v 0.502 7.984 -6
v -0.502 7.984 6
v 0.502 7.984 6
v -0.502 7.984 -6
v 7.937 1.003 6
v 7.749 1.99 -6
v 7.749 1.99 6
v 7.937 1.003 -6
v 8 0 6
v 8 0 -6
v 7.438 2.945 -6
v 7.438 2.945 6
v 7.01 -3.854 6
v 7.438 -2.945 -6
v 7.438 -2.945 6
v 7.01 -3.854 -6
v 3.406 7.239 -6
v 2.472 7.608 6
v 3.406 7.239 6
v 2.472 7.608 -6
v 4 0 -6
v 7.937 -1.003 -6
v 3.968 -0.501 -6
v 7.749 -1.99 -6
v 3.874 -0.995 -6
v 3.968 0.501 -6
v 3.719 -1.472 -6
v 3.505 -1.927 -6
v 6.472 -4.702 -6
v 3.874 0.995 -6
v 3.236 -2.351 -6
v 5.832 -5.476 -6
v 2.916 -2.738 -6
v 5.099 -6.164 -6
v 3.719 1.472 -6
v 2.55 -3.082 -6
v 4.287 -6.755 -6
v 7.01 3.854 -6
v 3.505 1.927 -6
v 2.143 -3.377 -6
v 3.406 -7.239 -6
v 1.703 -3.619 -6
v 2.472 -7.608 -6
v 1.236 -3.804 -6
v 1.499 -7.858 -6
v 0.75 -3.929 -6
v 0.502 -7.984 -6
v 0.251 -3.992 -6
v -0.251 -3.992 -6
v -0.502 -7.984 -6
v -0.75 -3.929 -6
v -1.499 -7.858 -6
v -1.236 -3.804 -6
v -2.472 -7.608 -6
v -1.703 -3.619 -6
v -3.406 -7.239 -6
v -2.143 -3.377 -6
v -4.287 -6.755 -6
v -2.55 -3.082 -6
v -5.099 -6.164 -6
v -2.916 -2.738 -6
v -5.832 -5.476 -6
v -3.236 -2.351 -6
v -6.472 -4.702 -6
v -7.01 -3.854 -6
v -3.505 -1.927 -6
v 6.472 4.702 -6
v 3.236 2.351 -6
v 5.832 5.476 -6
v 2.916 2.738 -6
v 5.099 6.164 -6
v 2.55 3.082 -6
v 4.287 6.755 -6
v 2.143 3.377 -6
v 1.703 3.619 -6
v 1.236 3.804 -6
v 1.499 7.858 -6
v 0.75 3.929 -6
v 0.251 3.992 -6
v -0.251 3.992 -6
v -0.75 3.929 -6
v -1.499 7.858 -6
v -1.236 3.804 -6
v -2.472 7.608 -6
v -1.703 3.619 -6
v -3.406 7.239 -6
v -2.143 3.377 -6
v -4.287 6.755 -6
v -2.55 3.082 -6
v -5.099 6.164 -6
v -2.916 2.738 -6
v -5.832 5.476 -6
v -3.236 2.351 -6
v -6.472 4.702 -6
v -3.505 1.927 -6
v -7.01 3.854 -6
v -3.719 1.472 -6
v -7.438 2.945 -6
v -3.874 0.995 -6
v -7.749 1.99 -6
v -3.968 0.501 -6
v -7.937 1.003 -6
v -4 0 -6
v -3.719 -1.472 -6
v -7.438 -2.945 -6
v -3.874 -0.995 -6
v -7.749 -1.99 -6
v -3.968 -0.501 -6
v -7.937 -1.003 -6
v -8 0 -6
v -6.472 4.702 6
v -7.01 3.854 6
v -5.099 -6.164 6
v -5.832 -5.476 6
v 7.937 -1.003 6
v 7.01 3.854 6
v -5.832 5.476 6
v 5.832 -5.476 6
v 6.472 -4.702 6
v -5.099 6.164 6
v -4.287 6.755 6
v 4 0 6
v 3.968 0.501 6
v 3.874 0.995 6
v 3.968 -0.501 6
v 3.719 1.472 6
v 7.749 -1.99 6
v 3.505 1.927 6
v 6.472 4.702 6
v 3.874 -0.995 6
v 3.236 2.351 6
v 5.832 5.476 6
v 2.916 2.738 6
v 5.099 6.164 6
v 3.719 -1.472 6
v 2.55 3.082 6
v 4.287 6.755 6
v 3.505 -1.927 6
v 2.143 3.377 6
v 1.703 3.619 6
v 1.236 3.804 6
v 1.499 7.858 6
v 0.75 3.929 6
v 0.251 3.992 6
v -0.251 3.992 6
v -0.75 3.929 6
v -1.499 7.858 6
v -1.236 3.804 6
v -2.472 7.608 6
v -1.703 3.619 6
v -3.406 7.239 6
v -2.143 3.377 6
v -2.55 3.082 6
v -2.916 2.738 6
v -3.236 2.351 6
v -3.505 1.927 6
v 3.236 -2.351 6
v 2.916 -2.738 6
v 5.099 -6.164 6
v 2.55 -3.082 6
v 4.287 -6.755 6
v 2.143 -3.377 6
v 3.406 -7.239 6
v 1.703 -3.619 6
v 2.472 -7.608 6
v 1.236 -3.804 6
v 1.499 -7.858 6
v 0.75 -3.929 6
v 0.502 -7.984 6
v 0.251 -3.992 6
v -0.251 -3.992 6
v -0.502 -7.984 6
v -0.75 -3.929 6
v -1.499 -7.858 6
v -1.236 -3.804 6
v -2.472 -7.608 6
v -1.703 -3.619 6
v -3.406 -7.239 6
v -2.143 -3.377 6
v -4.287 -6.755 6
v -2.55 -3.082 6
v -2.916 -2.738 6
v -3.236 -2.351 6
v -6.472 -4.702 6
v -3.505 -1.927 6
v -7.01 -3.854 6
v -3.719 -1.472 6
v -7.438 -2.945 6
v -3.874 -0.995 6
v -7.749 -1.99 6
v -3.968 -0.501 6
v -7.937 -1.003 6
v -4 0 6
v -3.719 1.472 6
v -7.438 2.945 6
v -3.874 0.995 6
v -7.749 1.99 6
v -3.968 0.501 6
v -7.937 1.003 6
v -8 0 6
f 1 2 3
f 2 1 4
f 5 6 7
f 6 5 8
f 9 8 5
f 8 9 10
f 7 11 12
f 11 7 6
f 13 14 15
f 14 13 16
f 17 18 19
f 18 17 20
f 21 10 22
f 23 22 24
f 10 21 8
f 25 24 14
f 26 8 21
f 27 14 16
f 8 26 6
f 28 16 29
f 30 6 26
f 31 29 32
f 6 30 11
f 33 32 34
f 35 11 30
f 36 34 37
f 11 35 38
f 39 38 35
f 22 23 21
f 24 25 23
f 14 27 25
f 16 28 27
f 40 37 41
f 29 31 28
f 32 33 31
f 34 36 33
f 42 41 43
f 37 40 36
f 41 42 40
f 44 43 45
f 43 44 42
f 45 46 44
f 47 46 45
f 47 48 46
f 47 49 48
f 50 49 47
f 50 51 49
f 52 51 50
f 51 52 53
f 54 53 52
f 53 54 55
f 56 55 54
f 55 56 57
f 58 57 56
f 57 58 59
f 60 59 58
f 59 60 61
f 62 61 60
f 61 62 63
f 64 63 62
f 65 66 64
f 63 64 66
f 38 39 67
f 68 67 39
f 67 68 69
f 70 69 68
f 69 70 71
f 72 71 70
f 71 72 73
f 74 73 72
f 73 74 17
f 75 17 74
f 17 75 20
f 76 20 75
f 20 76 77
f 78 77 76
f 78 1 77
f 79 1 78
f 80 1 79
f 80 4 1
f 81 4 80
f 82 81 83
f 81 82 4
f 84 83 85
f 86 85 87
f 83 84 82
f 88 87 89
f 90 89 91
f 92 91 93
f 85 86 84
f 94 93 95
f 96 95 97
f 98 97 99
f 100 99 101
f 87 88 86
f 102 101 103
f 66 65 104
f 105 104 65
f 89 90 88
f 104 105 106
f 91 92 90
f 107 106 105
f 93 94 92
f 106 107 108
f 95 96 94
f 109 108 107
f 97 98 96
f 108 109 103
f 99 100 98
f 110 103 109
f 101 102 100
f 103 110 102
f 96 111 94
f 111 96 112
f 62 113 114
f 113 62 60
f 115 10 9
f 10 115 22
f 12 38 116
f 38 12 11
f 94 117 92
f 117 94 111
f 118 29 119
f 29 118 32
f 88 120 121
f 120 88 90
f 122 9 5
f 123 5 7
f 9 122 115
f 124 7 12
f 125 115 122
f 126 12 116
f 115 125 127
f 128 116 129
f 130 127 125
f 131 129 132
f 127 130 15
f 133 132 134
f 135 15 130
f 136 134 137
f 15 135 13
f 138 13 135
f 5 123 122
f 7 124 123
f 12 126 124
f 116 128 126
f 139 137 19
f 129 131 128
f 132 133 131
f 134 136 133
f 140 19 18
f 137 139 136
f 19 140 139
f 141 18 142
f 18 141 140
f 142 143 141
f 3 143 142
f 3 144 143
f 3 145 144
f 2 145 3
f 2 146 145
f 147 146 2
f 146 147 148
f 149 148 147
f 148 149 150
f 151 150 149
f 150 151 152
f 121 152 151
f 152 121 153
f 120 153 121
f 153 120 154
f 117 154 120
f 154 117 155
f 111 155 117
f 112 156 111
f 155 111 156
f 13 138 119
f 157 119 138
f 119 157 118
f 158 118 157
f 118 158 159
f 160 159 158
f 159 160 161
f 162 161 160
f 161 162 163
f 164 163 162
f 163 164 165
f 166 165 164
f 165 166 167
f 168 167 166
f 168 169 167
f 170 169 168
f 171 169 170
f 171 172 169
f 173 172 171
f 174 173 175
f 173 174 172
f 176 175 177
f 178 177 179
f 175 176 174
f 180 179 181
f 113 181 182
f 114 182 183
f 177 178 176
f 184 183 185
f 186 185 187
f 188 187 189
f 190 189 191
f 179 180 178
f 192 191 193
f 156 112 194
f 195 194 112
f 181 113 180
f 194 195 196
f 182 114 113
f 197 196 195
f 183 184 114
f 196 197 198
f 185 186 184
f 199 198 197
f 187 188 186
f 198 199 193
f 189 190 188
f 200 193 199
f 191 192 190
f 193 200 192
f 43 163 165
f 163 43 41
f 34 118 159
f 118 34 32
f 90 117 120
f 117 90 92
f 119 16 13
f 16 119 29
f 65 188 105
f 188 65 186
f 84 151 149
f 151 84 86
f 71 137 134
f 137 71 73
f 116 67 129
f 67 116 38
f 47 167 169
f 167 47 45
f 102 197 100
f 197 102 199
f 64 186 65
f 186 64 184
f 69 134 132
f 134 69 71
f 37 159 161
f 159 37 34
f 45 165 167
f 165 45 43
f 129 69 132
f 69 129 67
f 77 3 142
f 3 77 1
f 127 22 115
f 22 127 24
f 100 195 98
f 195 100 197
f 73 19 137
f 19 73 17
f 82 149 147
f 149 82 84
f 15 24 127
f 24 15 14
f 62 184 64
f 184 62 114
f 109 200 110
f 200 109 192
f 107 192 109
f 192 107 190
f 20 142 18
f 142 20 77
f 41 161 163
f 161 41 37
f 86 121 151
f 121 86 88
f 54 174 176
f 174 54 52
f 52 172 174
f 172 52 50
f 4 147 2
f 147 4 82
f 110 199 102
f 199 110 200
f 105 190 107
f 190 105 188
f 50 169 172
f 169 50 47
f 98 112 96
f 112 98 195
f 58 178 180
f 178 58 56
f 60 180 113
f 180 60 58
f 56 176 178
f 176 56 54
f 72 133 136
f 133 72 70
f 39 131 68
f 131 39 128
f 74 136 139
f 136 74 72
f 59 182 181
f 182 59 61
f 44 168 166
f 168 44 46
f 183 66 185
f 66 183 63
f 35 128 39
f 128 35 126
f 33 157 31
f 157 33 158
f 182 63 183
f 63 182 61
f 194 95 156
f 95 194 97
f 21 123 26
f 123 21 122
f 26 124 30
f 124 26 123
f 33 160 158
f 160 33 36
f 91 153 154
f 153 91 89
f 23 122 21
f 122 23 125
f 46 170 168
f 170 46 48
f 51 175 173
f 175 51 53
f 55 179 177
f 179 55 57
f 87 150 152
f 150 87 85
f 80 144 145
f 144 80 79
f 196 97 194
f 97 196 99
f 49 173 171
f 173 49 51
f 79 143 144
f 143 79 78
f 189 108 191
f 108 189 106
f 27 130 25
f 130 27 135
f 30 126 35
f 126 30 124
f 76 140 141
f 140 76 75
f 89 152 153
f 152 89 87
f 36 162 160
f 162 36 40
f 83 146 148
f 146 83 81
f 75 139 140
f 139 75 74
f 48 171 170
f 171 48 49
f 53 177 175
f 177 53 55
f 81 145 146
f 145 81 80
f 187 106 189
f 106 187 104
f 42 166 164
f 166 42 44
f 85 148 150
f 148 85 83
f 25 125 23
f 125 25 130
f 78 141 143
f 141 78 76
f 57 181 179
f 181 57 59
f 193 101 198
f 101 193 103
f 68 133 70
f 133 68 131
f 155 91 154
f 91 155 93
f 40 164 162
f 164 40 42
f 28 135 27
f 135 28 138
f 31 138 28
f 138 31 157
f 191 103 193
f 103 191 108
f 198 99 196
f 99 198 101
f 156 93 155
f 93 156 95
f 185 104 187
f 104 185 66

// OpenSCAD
$fn = 50;


difference() {
	union() {
		translate(v = [0, 0, -6.0000000000]) {
			cylinder(h = 12, r = 8.0000000000);
		}
	}
	union() {
		translate(v = [0, 0, -100.0000000000]) {
			cylinder(h = 200, r = 4.0000000000);
		}
	}
}
